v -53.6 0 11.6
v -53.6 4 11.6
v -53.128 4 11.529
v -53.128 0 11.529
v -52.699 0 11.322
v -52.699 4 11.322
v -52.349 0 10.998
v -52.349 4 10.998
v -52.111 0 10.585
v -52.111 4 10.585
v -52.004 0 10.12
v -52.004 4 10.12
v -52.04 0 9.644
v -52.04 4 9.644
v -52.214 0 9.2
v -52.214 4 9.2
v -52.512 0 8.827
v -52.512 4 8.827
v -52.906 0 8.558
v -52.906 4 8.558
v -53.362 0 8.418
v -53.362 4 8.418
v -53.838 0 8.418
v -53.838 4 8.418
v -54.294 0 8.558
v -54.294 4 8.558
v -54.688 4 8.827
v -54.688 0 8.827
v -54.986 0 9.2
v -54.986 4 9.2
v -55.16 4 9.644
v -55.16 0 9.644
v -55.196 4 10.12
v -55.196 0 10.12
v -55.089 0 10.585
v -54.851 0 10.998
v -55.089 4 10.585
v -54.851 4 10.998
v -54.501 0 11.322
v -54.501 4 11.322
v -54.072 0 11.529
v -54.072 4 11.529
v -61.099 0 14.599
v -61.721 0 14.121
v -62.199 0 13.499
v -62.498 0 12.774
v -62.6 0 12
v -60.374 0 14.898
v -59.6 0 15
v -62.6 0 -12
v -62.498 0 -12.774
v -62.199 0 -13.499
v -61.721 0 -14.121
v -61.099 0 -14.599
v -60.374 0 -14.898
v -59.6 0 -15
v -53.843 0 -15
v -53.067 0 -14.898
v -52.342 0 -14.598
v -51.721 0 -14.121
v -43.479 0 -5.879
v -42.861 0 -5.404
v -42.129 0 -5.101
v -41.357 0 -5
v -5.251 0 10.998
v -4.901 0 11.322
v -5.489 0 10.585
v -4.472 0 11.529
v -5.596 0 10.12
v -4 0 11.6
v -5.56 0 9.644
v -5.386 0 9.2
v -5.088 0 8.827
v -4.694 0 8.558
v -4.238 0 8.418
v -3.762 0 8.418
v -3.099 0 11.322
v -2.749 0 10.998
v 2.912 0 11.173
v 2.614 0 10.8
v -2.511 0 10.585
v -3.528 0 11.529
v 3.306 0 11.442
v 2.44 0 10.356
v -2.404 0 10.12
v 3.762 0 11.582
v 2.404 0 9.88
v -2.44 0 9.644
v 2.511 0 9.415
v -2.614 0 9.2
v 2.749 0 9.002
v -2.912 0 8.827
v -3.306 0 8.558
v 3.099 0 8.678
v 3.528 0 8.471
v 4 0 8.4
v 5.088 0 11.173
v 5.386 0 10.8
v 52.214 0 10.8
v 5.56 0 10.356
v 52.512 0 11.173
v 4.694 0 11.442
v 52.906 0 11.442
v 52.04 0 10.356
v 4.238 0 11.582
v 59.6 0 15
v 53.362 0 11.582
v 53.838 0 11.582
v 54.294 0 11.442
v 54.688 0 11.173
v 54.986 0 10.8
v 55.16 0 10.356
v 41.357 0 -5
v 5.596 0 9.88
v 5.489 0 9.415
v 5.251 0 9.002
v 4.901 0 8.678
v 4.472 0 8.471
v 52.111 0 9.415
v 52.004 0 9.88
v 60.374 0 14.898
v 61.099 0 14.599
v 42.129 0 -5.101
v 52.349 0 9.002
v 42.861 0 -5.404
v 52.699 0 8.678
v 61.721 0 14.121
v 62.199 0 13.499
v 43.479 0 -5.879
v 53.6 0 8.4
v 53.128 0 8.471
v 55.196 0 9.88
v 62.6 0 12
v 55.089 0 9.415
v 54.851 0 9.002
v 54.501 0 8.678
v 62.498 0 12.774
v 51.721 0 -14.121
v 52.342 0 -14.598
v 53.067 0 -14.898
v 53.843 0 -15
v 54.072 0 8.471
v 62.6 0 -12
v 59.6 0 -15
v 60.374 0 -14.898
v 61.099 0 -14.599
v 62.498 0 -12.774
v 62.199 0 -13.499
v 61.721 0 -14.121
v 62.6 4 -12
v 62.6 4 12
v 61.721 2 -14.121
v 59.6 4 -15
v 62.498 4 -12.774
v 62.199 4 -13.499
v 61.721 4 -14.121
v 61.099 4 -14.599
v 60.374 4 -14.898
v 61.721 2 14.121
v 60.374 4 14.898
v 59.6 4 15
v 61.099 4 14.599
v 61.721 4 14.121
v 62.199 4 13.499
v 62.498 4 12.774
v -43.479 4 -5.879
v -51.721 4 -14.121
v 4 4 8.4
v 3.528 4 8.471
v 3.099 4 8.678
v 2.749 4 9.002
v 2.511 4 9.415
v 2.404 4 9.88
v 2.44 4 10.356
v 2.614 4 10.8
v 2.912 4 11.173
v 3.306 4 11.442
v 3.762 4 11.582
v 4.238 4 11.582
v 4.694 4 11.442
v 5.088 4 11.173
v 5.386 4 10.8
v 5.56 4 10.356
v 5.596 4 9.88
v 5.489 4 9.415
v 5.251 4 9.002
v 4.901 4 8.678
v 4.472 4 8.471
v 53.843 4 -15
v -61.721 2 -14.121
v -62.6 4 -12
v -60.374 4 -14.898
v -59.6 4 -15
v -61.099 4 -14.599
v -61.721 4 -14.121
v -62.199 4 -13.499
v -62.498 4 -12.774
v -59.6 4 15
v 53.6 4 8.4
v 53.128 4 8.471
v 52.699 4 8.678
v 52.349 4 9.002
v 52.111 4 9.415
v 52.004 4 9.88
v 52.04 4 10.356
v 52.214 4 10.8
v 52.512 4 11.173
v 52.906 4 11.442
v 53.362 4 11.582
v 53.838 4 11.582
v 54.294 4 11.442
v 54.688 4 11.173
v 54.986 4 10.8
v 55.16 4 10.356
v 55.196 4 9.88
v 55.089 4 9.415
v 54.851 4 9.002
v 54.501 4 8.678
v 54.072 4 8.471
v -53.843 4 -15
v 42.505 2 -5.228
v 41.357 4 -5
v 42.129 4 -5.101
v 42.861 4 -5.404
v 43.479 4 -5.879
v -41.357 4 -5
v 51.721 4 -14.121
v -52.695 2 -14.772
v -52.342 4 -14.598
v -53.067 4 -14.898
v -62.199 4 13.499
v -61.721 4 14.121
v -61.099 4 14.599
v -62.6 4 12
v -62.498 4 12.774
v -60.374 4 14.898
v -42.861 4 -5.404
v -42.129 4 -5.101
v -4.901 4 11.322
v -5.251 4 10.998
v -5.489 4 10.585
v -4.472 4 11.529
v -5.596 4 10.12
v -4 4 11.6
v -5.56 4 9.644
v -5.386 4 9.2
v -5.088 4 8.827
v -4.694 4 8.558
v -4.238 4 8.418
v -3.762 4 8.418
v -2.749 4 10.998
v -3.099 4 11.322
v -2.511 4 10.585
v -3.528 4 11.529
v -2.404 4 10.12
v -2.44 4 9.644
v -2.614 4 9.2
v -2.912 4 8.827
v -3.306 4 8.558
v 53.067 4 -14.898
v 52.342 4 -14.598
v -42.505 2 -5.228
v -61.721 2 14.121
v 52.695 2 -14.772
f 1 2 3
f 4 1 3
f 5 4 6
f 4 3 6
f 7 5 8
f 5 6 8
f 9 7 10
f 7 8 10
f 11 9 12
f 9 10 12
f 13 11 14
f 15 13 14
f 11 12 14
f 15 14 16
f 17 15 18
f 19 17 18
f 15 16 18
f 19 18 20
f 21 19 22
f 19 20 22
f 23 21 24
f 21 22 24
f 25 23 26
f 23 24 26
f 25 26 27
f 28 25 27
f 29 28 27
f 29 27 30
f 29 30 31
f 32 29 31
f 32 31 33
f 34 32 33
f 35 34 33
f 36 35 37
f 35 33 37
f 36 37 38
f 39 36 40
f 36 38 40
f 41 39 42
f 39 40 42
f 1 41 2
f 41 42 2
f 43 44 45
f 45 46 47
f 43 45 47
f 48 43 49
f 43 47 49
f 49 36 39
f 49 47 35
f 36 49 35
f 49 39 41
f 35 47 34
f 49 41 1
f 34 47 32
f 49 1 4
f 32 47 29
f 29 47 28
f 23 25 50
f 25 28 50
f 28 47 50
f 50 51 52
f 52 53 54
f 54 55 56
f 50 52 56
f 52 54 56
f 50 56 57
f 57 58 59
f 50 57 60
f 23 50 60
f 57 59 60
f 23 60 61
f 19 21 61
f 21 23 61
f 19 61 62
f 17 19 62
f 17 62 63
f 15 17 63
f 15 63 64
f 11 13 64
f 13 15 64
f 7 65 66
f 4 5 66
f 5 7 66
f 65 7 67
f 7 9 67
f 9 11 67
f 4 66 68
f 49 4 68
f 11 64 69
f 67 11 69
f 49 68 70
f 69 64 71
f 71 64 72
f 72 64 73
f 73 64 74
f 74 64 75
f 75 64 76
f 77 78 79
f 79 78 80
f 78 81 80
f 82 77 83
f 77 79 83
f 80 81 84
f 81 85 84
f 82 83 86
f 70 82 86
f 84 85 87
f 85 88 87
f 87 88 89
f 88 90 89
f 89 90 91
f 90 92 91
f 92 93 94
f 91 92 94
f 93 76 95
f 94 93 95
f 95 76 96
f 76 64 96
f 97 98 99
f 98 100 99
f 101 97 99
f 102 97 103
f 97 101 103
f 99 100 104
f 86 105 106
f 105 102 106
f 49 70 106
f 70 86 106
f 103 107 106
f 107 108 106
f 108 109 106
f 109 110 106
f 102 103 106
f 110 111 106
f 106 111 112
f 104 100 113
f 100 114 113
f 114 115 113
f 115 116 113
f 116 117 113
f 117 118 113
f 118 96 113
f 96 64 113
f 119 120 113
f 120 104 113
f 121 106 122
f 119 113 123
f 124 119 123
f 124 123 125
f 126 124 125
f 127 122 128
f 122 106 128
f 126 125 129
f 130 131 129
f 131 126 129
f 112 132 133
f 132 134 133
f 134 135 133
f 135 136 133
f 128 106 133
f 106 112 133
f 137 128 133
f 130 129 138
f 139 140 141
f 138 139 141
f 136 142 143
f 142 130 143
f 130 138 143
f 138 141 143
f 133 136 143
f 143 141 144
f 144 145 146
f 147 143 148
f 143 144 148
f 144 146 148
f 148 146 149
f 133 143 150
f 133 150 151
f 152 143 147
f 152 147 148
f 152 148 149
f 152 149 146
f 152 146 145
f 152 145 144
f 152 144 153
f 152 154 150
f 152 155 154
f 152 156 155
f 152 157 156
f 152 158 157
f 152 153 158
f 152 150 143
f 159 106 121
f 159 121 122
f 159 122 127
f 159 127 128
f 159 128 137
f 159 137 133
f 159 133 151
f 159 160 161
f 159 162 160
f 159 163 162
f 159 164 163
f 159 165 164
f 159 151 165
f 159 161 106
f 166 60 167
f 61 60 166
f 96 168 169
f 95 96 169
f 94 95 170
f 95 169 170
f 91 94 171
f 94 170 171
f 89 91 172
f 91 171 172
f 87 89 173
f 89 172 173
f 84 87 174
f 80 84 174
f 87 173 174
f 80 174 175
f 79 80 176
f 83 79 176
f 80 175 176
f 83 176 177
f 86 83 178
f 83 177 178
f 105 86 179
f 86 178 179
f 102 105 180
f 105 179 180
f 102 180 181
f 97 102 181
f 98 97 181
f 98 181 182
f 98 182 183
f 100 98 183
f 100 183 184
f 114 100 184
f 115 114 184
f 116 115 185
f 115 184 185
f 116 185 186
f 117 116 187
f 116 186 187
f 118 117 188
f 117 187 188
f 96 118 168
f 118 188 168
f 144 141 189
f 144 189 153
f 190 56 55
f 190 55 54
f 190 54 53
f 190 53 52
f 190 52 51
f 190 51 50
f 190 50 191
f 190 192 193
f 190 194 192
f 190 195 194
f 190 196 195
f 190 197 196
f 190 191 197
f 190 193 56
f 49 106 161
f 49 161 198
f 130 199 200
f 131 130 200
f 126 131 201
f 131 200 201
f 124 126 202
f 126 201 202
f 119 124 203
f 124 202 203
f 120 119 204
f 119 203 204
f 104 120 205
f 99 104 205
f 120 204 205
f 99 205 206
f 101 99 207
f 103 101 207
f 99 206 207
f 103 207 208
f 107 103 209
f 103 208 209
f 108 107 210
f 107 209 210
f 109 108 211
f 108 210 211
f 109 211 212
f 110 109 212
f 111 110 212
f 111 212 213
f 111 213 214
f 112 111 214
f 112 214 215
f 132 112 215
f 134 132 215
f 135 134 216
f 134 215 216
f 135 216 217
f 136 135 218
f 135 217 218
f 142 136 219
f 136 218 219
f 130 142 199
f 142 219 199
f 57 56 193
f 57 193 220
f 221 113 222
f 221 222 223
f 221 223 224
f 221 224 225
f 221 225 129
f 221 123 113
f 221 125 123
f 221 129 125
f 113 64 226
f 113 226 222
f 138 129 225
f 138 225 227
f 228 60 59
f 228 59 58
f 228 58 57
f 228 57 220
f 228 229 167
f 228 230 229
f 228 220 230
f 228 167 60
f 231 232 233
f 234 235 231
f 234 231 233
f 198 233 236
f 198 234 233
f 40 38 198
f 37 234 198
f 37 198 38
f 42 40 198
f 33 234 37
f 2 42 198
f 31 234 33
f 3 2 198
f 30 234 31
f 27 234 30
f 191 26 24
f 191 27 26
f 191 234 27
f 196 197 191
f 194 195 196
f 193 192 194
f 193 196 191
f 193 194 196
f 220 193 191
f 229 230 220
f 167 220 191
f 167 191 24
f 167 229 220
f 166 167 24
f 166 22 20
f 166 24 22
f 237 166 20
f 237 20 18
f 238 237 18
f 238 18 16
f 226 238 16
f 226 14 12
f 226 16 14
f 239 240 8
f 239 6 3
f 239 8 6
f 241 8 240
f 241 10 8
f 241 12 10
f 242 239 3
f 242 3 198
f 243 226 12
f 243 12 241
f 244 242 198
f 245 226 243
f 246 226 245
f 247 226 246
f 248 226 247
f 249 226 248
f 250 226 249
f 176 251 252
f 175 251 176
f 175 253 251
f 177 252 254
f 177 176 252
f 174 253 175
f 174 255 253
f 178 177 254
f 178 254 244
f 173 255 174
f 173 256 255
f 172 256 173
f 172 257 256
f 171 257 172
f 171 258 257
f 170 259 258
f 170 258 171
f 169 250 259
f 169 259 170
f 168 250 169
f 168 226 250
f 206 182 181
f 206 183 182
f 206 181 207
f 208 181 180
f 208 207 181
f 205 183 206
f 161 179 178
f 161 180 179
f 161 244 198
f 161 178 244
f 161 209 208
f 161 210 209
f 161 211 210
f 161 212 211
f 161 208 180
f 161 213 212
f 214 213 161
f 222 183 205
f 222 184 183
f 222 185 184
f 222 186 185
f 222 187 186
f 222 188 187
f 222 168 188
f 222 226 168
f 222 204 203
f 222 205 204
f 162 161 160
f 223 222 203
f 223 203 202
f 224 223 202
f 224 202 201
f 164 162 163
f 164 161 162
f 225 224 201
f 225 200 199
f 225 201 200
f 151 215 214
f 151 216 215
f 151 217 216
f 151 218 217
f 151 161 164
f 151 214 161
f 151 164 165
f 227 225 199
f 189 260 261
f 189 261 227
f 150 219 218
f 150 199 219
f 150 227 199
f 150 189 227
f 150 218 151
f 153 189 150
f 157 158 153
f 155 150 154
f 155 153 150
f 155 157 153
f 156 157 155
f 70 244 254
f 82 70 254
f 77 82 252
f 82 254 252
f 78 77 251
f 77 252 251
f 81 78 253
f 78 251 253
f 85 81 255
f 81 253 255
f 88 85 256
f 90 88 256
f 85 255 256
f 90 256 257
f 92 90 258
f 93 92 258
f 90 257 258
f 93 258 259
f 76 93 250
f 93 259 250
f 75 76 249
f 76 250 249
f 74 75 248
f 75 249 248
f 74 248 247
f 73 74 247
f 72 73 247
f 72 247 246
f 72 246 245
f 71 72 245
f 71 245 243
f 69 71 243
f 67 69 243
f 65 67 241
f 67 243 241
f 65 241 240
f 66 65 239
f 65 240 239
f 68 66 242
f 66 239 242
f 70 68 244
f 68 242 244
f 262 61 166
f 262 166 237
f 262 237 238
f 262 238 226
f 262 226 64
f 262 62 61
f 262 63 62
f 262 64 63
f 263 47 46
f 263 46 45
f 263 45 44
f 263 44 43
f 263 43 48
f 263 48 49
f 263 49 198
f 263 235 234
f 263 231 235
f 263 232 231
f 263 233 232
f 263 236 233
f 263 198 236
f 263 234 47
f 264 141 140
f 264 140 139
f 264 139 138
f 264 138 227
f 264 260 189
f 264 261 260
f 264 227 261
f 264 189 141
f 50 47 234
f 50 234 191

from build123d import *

# Parameters (mm, degrees)
EXTRUDE_2_DEPTH     = 4
SKETCH_6_R          = 1.6
CUT_EXTRUDE_2_DEPTH = 4
FILLET_2_R          = 3


with BuildPart() as part:
    # 草图1 → 凸台-拉伸2 (new body)
    with BuildSketch(Plane(origin=(0, 0, 0), x_dir=(1, 0, 0), z_dir=(0, 1, 0))):
        Polygon((-62.6, 15), (-52.6, 15), (-42.6, 5), (42.6, 5), (52.6, 15), (62.6, 15), (62.6, -15), (-62.6, -15), align=None)
    extrude(amount=EXTRUDE_2_DEPTH)

    # 草图6 → 切除-拉伸2 (cut)
    with BuildSketch(Plane(origin=(0, 4, 0), x_dir=(1, 0, 0), z_dir=(0, 1, 0))):
        with Locations((-53.6, -10)):
            Circle(SKETCH_6_R)
        with Locations((-4, -10)):
            Circle(SKETCH_6_R)
        with Locations((4, -10)):
            Circle(SKETCH_6_R)
        with Locations((53.6, -10)):
            Circle(SKETCH_6_R)
    extrude(amount=-CUT_EXTRUDE_2_DEPTH, mode=Mode.SUBTRACT)

    # 圆角2
    fillet_2_edges = [part.edges().sort_by_distance(p)[0] for p in [
        (62.6, 2, 15),
        (-62.6, 2, 15),
        (-52.6, 2, -15),
        (-42.6, 2, -5),
        (42.6, 2, -5),
        (52.6, 2, -15),
        (62.6, 2, -15),
        (-62.6, 2, -15),
    ]]
    fillet(fillet_2_edges, radius=FILLET_2_R)


solid = part.part
